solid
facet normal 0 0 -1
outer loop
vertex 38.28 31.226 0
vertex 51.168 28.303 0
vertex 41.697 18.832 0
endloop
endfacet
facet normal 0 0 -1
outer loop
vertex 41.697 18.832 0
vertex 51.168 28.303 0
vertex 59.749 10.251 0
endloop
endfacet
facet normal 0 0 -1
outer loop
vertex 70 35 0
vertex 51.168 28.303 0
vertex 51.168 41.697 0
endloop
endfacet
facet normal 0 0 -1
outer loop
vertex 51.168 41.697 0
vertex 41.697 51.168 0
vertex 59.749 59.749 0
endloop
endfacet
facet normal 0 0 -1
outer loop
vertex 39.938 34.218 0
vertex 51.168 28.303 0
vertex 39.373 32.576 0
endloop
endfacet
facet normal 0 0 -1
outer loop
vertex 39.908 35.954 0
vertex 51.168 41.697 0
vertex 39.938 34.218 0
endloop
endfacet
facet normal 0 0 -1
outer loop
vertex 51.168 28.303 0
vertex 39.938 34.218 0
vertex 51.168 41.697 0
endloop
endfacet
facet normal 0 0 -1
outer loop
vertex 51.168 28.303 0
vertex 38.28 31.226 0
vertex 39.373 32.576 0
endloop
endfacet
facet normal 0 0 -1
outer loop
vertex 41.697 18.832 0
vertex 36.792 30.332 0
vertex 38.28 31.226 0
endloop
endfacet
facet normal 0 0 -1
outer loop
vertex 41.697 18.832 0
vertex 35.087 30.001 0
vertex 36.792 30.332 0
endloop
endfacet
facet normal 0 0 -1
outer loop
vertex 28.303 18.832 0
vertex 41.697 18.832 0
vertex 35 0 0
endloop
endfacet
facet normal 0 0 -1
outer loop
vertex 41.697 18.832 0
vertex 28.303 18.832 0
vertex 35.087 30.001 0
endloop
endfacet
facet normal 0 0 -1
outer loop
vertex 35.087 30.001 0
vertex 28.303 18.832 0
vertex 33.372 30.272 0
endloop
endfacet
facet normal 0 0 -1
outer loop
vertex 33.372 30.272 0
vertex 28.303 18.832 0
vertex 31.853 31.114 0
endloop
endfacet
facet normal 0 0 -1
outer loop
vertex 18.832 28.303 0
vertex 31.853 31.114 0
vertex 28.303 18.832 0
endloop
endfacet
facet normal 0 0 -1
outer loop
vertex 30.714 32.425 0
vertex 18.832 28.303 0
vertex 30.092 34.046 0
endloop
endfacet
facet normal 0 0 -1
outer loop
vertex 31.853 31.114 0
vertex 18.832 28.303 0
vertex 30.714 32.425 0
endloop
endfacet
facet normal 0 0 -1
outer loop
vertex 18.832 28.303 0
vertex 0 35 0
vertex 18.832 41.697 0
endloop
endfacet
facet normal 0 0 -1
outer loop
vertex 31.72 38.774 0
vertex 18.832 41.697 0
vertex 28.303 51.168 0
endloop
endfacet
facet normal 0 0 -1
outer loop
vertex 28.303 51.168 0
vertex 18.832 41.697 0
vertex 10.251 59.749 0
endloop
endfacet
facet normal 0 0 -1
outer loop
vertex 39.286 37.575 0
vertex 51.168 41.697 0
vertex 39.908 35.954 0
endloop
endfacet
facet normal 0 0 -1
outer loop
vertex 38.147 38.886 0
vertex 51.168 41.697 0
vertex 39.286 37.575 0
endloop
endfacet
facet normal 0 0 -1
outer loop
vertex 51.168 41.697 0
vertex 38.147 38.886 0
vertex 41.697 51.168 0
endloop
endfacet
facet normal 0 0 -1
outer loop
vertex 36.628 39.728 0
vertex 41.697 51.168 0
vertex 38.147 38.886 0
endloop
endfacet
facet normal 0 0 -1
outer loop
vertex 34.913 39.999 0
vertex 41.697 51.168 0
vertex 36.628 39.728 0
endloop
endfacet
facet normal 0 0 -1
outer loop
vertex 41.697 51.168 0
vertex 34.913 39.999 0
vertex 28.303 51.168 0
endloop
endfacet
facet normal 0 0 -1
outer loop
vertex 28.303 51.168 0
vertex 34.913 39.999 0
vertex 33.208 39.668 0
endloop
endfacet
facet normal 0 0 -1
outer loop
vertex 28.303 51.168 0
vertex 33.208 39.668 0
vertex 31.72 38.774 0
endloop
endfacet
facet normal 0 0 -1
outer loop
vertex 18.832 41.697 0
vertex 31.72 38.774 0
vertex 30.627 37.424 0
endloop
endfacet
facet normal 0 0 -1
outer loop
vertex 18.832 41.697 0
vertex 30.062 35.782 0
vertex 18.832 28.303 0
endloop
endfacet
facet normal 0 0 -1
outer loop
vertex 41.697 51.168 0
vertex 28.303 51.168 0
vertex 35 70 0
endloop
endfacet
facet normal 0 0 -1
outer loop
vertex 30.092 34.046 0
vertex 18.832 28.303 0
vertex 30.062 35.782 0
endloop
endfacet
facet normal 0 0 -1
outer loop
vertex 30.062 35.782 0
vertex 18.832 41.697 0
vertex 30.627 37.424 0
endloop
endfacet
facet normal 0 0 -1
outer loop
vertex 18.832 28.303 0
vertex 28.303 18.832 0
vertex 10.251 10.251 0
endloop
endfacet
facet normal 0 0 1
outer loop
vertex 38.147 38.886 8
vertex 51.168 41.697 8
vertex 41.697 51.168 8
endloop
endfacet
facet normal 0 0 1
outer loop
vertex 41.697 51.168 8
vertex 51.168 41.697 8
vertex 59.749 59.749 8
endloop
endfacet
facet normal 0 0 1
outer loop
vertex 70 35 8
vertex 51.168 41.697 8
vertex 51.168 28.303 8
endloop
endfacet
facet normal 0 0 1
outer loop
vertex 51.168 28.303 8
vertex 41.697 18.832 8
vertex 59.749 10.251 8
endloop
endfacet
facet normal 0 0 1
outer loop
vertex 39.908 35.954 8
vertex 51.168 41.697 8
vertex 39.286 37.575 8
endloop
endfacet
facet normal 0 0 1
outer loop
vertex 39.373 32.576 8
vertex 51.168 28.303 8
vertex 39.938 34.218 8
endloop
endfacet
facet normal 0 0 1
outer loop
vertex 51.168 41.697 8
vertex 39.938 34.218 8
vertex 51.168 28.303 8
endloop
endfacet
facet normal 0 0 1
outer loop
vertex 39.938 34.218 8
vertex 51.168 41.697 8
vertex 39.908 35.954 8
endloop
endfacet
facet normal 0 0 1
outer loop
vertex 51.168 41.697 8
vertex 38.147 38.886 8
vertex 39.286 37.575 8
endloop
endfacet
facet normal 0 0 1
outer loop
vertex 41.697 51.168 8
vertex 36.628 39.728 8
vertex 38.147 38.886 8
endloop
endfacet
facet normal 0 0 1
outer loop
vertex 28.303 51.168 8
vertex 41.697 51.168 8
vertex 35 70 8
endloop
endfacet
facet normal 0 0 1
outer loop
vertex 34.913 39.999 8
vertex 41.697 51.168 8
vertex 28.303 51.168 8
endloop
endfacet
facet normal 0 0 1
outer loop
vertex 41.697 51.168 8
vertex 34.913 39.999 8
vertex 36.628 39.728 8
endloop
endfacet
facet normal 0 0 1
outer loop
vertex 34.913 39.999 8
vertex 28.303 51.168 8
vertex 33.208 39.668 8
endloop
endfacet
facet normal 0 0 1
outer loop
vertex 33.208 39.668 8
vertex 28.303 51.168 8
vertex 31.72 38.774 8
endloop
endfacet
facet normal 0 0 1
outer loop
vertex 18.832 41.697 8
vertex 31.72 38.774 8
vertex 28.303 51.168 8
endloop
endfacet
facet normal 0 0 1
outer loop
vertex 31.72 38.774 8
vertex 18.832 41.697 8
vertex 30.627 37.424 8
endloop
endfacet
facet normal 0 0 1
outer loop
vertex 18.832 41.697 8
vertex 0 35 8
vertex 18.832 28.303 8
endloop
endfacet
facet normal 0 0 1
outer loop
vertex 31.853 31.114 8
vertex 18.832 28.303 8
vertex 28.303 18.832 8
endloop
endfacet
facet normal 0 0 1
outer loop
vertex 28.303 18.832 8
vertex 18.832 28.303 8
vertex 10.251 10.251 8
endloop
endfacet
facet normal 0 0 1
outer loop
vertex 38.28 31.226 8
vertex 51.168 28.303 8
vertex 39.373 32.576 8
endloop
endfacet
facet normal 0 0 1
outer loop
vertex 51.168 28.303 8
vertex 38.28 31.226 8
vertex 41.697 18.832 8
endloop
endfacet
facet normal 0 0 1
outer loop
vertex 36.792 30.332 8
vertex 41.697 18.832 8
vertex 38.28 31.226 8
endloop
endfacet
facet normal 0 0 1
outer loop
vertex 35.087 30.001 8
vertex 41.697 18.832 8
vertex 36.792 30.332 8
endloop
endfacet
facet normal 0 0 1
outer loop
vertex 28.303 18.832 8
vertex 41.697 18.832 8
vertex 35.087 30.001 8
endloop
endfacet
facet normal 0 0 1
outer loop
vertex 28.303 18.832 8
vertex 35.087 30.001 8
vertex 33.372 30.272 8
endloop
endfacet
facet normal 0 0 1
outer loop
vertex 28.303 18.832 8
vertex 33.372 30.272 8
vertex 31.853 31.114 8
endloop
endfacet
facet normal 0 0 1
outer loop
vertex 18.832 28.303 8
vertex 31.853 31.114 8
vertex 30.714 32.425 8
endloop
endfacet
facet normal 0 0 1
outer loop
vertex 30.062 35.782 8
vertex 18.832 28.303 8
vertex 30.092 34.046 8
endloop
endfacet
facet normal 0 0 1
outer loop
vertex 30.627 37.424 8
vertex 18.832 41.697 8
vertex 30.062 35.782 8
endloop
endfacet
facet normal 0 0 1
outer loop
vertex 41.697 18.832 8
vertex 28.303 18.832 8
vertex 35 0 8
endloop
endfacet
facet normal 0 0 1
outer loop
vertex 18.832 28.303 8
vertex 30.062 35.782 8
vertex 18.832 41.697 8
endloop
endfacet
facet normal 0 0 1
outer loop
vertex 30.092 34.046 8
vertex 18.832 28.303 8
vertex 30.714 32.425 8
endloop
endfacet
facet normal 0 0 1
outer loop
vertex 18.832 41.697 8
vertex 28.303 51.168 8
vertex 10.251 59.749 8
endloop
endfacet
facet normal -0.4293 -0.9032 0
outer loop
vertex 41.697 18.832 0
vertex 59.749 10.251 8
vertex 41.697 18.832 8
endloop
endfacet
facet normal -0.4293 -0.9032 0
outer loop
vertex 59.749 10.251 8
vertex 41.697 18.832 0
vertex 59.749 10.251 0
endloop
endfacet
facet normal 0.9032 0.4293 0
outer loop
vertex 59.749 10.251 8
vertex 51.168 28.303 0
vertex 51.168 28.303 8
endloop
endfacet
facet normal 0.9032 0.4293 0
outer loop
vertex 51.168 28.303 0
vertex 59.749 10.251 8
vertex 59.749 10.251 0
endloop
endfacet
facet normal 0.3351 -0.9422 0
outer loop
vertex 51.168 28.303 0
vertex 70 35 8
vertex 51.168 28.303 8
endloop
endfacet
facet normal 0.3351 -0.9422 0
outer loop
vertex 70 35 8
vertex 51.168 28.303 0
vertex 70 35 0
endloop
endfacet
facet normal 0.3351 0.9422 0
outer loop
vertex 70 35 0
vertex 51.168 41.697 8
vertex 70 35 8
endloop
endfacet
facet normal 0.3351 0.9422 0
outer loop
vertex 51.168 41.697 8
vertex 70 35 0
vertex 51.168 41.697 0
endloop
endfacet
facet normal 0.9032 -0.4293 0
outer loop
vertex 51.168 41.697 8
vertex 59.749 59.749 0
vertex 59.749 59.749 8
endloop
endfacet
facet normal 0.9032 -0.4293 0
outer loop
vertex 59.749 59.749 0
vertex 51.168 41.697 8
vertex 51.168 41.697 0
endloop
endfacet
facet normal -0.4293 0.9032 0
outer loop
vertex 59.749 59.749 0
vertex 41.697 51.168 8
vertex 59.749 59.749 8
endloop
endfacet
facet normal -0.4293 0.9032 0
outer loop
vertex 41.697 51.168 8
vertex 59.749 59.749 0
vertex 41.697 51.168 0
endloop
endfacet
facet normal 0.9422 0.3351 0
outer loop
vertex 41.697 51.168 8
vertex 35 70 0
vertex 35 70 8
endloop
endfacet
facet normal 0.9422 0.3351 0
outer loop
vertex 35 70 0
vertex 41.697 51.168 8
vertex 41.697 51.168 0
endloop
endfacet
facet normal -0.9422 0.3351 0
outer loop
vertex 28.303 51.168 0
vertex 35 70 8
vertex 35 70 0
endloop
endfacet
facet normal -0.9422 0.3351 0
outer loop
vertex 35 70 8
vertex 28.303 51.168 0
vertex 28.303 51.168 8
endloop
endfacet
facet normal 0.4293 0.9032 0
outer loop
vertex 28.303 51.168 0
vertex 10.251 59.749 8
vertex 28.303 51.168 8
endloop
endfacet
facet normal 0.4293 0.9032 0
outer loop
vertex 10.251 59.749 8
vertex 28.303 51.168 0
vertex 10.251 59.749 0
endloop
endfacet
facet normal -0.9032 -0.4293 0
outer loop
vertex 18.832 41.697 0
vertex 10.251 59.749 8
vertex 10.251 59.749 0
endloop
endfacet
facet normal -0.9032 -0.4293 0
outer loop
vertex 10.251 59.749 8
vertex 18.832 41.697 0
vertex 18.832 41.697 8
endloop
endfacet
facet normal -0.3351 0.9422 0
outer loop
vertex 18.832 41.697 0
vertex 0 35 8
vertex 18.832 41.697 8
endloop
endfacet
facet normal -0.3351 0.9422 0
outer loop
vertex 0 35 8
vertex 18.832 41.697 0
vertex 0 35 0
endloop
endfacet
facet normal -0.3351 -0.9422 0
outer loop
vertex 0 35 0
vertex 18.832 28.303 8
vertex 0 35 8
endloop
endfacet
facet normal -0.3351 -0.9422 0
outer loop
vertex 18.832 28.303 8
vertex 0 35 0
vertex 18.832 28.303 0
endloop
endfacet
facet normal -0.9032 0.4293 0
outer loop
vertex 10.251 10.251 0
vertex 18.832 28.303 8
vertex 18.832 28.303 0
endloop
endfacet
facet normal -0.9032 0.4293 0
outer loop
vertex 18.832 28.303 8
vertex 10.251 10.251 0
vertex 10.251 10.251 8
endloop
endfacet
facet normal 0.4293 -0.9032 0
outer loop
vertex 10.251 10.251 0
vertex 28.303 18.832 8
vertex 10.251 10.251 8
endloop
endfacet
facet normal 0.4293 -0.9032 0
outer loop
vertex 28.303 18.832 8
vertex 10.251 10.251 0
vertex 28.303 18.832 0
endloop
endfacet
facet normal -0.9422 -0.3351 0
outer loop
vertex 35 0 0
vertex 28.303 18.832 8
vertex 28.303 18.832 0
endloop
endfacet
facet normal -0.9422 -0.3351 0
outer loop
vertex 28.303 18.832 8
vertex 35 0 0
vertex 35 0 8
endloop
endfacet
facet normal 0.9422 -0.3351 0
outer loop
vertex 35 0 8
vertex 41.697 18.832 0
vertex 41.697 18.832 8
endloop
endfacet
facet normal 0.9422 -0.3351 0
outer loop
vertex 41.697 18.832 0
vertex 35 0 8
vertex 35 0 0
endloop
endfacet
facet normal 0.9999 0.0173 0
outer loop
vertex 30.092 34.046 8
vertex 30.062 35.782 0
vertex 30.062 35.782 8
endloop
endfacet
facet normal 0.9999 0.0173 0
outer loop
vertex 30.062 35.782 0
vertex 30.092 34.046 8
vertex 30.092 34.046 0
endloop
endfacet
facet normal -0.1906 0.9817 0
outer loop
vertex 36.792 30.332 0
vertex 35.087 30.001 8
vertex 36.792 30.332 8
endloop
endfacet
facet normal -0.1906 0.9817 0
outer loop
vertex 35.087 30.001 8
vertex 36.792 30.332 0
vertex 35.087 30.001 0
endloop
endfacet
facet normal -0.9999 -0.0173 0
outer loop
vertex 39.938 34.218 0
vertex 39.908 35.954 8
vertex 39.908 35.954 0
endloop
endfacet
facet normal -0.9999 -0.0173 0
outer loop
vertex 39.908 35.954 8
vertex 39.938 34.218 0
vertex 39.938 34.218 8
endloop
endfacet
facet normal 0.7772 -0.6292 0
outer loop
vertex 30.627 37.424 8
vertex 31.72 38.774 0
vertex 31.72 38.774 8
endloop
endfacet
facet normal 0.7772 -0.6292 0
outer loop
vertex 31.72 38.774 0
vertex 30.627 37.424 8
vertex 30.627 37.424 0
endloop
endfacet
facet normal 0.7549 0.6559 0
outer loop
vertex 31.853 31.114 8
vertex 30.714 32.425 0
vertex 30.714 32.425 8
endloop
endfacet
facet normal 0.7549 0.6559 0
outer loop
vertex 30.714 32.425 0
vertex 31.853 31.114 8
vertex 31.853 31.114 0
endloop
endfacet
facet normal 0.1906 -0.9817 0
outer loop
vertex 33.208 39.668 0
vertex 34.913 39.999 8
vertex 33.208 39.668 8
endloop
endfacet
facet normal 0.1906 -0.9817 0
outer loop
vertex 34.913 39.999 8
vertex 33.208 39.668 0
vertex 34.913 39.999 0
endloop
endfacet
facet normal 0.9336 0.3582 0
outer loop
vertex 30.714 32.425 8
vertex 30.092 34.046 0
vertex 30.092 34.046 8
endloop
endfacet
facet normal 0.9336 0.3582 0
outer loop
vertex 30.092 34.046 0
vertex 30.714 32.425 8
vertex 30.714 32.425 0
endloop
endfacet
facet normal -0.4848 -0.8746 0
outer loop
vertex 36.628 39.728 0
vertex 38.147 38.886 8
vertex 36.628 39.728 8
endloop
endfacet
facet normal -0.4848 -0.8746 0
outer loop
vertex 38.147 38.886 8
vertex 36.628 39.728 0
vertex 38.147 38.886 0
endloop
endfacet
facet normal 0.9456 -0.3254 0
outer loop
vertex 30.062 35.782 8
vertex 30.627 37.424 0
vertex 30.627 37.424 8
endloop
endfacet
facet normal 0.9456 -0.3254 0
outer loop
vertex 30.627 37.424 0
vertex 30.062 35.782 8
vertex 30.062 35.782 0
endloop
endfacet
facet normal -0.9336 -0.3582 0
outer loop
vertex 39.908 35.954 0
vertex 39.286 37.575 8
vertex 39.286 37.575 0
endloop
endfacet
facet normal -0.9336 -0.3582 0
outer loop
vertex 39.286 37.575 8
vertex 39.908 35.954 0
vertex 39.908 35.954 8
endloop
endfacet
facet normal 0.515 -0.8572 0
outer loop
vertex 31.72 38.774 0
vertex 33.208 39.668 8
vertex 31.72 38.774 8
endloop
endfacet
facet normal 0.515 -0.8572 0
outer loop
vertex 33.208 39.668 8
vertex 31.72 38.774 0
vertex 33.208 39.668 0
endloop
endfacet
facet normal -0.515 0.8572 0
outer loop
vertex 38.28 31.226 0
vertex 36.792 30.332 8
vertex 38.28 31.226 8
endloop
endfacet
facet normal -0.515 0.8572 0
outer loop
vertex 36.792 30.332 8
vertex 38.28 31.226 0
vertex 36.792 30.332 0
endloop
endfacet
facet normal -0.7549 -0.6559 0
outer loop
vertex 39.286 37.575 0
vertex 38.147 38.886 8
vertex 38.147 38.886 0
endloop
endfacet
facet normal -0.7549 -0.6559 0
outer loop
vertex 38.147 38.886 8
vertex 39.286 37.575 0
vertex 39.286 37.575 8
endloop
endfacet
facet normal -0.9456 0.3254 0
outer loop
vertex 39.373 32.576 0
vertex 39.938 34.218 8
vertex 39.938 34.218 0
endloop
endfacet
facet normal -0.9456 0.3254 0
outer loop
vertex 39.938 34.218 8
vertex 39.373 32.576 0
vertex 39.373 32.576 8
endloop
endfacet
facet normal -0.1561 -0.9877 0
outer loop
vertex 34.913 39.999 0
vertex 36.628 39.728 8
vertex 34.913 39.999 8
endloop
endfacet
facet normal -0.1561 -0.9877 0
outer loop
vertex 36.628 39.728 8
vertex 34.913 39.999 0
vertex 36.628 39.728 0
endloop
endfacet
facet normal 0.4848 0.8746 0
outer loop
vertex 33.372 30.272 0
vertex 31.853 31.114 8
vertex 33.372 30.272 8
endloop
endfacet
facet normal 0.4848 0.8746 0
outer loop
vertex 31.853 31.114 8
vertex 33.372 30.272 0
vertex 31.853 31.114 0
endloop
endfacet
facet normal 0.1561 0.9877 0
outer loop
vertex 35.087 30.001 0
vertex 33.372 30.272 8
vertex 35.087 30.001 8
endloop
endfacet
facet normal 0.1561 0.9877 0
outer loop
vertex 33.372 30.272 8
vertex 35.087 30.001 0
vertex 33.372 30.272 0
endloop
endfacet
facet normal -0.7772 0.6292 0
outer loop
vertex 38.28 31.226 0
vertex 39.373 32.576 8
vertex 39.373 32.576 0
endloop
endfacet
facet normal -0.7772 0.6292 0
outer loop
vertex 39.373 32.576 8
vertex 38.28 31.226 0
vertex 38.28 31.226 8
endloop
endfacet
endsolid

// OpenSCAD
$fn = 32;

// ----------------------------------------------------------------------
// Star wheel: 8-point star, R35
// ----------------------------------------------------------------------

// --- parameters (mm) ---
n_points = 8;             // number of points / teeth
r_out = 35;               // tip radius
r_in = 17.5;              // root radius
bore_r = 5;               // centre bore radius
plate_t = 8;              // plate thickness, Z (extrusion height)
bore_d = 10;              // centre bore diameter

profile = [[70, 35], [51.168, 41.697], [59.749, 59.749], [41.697, 51.168], [35, 70], [28.303, 51.168], [10.251, 59.749], [18.832, 41.697], [0, 35], [18.832, 28.303], [10.251, 10.251], [28.303, 18.832], [35, 0], [41.697, 18.832], [59.749, 10.251], [51.168, 28.303]];  // primary outline, 16 points, counter clockwise
void_1 = [[39.908, 35.954], [39.286, 37.575], [38.147, 38.886], [36.628, 39.728], [34.913, 39.999], [33.208, 39.668], [31.72, 38.774], [30.627, 37.424], [30.062, 35.782], [30.092, 34.046], [30.714, 32.425], [31.853, 31.114], [33.372, 30.272], [35.087, 30.001], [36.792, 30.332], [38.28, 31.226], [39.373, 32.576], [39.938, 34.218]];  // centre bore, 18 points

// --- the one profile operation ---
difference() {
  linear_extrude(height = plate_t) polygon(points = profile);
  translate([0, 0, -1])
    linear_extrude(height = plate_t + 2) polygon(points = void_1);
}
